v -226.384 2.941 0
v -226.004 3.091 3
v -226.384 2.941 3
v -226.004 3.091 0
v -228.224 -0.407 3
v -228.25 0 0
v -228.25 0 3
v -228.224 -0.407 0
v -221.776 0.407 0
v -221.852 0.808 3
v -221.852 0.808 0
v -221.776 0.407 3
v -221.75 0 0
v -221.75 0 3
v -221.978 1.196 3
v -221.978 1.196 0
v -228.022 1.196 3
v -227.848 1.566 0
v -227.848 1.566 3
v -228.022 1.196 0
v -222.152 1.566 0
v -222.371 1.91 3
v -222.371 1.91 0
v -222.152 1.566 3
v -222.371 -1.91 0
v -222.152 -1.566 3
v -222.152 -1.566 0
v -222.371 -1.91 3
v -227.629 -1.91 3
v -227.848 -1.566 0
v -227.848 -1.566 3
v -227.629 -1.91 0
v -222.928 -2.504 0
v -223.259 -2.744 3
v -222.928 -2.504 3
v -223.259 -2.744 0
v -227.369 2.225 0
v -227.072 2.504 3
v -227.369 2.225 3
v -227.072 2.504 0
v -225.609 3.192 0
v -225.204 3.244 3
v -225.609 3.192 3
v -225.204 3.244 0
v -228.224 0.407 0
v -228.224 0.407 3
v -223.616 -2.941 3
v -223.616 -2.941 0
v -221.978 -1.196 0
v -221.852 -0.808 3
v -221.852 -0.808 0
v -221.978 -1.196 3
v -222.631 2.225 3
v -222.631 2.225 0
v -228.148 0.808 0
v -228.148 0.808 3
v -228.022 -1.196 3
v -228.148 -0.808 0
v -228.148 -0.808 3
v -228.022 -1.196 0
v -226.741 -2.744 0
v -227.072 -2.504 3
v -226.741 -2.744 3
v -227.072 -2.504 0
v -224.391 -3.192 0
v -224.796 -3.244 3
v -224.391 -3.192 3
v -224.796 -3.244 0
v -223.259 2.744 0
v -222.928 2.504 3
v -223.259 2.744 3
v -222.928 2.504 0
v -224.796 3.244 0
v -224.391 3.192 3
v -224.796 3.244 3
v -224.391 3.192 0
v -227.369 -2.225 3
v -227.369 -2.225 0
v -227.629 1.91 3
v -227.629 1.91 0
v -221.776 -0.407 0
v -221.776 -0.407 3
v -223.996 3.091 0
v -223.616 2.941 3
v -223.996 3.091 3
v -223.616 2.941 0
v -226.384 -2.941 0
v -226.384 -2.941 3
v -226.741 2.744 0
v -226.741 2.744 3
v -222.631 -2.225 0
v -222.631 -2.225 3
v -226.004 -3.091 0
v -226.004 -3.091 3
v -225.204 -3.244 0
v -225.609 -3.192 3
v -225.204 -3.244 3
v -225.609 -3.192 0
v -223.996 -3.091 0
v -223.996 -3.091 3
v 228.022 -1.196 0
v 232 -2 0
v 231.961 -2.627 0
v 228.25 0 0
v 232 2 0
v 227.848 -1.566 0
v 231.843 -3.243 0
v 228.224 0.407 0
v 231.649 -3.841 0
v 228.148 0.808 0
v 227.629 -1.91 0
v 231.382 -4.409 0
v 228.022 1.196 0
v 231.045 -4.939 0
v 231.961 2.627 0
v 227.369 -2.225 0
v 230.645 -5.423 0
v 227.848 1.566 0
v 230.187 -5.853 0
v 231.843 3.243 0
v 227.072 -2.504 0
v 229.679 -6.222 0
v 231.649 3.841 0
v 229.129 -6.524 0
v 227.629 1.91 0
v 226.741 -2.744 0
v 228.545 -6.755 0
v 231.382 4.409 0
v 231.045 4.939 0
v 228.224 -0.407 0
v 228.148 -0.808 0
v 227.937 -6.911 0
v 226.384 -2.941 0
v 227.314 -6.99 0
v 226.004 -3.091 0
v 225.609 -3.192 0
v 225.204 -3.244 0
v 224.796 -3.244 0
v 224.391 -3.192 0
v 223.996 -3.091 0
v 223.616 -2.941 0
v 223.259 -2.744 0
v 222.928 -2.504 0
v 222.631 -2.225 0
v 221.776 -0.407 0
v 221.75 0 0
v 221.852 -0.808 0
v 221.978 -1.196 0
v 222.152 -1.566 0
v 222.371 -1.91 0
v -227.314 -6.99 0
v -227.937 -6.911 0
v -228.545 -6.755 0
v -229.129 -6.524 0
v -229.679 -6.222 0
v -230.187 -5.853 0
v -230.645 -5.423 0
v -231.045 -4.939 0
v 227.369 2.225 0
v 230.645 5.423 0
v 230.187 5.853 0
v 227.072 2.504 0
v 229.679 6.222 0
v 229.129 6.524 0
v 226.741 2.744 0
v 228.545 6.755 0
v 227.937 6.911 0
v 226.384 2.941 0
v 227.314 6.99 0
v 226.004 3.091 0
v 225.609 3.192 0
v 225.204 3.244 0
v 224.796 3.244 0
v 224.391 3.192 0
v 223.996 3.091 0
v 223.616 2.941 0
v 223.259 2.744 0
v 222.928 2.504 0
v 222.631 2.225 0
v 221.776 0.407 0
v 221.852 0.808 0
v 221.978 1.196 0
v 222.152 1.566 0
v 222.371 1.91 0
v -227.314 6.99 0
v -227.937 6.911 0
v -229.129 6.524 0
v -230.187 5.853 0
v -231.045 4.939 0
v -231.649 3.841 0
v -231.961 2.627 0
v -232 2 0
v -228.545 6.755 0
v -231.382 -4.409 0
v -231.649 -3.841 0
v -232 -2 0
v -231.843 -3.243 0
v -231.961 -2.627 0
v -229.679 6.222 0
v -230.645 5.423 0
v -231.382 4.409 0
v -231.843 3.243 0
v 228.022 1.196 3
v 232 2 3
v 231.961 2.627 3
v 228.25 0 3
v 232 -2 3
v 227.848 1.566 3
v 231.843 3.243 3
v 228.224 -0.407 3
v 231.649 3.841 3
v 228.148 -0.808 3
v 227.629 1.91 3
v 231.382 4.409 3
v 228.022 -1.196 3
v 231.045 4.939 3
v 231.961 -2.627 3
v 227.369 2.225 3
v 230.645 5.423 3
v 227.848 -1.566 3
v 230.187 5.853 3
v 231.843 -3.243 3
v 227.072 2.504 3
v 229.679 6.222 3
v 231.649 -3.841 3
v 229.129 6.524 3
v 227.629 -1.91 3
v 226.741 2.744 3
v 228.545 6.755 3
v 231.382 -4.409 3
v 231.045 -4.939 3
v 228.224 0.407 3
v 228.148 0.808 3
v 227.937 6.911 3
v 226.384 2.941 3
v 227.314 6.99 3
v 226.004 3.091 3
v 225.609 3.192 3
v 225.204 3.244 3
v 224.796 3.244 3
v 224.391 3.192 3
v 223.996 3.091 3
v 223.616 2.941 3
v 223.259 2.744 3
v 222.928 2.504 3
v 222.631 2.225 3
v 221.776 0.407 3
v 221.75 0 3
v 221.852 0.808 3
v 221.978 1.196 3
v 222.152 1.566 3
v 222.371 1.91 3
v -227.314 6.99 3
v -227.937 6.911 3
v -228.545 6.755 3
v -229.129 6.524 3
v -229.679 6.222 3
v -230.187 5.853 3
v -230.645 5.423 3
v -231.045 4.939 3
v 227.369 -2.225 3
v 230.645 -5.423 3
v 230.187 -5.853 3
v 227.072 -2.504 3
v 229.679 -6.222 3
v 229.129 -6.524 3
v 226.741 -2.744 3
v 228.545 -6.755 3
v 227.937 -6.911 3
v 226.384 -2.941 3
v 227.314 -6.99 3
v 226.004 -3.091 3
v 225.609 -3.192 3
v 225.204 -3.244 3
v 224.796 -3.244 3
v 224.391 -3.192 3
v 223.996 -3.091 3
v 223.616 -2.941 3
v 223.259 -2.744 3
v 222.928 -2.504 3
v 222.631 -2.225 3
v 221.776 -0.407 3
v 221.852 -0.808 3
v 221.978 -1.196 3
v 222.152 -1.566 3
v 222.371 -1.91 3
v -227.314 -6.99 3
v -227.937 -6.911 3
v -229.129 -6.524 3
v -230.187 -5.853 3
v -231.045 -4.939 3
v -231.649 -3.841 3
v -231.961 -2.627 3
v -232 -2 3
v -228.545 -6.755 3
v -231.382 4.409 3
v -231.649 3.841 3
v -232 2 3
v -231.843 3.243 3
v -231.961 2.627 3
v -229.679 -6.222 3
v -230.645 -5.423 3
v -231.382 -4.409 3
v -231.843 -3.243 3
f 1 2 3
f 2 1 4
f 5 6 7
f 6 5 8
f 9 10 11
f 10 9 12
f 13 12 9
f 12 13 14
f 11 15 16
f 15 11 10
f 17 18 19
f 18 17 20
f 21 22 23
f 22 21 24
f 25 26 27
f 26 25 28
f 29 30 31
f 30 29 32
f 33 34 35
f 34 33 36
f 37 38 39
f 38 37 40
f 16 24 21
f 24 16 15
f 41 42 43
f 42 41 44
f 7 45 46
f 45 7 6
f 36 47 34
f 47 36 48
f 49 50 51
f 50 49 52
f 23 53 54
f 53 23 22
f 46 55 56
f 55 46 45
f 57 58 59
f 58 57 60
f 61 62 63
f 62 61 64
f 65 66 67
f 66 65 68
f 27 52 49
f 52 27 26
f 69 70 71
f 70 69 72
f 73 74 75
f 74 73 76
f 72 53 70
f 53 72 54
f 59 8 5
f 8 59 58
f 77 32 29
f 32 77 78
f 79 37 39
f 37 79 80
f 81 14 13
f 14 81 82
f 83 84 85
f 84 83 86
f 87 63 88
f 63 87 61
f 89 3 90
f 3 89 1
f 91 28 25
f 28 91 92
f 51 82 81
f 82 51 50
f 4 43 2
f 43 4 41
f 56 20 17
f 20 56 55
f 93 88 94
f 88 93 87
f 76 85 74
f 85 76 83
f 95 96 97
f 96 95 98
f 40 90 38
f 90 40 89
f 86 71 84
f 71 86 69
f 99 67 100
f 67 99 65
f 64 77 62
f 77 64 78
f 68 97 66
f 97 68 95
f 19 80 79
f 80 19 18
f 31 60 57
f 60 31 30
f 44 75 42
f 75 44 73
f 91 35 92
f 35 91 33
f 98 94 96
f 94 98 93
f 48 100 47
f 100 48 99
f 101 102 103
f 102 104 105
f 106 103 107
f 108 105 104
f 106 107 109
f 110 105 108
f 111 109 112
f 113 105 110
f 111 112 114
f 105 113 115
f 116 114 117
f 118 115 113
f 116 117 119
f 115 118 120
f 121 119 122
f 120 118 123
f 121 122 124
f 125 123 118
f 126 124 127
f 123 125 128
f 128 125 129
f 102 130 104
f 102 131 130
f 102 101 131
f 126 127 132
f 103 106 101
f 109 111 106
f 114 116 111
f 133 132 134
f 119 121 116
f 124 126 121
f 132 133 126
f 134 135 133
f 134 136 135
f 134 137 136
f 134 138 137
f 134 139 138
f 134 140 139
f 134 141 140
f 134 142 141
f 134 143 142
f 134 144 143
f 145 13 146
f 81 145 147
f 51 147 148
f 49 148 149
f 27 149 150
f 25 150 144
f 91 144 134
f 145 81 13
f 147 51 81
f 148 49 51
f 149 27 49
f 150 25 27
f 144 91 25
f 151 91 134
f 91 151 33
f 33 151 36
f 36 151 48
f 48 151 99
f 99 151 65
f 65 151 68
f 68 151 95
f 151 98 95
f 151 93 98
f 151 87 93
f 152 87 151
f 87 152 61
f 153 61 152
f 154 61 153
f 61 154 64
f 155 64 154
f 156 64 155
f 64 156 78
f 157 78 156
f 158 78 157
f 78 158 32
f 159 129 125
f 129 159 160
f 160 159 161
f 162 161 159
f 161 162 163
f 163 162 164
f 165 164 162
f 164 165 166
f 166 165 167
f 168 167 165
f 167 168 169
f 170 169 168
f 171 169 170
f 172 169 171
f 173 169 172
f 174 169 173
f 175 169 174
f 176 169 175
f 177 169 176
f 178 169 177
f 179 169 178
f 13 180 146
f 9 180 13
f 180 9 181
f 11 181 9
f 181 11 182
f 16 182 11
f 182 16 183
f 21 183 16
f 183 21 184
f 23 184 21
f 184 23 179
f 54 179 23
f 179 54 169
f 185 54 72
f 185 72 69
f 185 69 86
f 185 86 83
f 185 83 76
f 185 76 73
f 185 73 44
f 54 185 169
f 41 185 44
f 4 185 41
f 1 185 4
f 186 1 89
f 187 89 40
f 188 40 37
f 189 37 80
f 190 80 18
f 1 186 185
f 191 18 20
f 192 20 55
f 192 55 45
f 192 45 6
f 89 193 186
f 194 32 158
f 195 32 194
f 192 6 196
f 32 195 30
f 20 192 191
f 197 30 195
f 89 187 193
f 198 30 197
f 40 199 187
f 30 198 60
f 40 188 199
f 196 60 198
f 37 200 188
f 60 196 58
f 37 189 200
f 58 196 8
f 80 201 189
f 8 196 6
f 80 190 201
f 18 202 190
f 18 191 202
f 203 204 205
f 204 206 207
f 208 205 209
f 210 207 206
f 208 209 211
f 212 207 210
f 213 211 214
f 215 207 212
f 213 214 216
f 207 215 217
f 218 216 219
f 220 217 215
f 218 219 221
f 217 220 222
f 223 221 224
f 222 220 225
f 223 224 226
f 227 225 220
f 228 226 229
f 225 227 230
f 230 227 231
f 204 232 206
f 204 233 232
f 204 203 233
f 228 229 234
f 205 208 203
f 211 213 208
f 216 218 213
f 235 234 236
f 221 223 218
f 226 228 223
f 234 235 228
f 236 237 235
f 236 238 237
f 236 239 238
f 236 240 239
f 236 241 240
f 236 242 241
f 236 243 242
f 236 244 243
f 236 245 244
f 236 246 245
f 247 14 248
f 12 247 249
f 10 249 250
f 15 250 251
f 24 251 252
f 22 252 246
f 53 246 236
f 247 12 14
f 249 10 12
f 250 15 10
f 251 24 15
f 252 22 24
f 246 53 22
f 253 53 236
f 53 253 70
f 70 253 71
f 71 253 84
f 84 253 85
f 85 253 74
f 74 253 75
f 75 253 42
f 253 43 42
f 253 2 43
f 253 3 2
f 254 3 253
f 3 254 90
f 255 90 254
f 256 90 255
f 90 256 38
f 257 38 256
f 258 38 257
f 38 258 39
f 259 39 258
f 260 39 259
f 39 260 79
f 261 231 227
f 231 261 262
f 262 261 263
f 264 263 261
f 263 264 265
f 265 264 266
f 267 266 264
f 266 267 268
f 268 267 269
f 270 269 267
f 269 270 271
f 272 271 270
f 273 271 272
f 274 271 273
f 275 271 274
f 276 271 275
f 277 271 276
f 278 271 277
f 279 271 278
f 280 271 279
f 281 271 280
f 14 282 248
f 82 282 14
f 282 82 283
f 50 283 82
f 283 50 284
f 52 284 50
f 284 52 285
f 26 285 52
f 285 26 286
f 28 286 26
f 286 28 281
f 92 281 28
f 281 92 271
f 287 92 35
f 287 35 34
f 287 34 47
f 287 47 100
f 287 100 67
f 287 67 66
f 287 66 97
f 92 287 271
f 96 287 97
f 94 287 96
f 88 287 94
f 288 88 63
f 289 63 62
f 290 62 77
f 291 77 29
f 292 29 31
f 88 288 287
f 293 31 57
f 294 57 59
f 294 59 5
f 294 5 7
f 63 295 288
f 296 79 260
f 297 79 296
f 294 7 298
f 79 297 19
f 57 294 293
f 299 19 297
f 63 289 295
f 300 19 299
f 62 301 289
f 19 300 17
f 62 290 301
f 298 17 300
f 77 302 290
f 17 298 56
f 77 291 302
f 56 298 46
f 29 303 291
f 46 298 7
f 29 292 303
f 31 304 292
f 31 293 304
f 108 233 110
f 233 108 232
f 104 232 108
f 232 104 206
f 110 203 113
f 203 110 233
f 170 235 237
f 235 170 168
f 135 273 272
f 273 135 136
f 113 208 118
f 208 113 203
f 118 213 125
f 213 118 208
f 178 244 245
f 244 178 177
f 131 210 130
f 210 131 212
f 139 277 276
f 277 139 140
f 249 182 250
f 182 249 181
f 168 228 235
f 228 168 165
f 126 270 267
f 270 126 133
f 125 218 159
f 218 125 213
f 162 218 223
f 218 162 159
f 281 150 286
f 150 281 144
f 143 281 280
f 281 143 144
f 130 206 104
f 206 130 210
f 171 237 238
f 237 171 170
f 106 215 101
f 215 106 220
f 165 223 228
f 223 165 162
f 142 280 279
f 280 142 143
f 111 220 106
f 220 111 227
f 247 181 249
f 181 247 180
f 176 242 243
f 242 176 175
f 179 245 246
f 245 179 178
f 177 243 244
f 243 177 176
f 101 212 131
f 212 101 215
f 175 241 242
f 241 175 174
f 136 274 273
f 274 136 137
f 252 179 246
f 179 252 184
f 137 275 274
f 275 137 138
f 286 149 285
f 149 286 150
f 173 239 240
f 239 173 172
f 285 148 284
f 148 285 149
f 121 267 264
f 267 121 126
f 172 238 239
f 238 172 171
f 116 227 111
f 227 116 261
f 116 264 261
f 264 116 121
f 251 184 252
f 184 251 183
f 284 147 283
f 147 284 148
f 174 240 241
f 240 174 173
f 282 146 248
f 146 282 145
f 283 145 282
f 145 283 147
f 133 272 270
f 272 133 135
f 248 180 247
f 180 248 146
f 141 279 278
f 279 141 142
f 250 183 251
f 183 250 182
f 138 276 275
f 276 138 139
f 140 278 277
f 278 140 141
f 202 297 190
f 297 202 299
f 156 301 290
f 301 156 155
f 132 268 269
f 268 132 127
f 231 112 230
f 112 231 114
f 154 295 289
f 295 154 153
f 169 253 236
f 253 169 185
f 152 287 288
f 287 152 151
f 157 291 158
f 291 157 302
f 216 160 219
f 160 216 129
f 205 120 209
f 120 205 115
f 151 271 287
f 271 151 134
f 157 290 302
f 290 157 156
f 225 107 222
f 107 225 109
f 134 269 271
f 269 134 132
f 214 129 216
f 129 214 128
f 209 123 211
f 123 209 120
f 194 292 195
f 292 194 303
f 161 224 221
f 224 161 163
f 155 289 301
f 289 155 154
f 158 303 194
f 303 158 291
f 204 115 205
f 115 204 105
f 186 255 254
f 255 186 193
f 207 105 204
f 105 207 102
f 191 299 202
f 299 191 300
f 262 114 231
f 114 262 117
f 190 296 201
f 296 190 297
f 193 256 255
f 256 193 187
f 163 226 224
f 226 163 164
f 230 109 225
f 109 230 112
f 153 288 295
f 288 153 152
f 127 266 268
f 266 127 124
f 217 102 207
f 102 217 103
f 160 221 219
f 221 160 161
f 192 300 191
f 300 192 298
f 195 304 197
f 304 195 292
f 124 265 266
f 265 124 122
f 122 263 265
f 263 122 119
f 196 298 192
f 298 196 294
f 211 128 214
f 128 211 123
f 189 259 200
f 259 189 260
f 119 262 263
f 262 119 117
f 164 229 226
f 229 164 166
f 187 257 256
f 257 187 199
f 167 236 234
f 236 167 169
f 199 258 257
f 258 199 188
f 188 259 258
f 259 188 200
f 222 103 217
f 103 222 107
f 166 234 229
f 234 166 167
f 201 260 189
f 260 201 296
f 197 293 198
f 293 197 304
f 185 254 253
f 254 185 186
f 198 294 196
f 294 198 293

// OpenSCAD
$fn = 50;


difference() {
	union() {
		hull() {
			translate(v = [-227.0000000000, 2.0000000000, 0]) {
				cylinder(h = 3, r = 5);
			}
			translate(v = [227.0000000000, 2.0000000000, 0]) {
				cylinder(h = 3, r = 5);
			}
			translate(v = [-227.0000000000, -2.0000000000, 0]) {
				cylinder(h = 3, r = 5);
			}
			translate(v = [227.0000000000, -2.0000000000, 0]) {
				cylinder(h = 3, r = 5);
			}
		}
	}
	union() {
		translate(v = [-225.0000000000, 0.0000000000, 0]) {
			cylinder(h = 3, r = 3.2500000000);
		}
		translate(v = [225.0000000000, 0.0000000000, 0]) {
			cylinder(h = 3, r = 3.2500000000);
		}
		translate(v = [-225.0000000000, 0.0000000000, 0]) {
			cylinder(h = 3, r = 1.8000000000);
		}
		translate(v = [225.0000000000, 0.0000000000, 0]) {
			cylinder(h = 3, r = 1.8000000000);
		}
		translate(v = [-225.0000000000, 0.0000000000, 0]) {
			cylinder(h = 3, r = 1.8000000000);
		}
		translate(v = [225.0000000000, 0.0000000000, 0]) {
			cylinder(h = 3, r = 1.8000000000);
		}
		translate(v = [-225.0000000000, 0.0000000000, 0]) {
			cylinder(h = 3, r = 1.8000000000);
		}
		translate(v = [225.0000000000, 0.0000000000, 0]) {
			cylinder(h = 3, r = 1.8000000000);
		}
	}
}
